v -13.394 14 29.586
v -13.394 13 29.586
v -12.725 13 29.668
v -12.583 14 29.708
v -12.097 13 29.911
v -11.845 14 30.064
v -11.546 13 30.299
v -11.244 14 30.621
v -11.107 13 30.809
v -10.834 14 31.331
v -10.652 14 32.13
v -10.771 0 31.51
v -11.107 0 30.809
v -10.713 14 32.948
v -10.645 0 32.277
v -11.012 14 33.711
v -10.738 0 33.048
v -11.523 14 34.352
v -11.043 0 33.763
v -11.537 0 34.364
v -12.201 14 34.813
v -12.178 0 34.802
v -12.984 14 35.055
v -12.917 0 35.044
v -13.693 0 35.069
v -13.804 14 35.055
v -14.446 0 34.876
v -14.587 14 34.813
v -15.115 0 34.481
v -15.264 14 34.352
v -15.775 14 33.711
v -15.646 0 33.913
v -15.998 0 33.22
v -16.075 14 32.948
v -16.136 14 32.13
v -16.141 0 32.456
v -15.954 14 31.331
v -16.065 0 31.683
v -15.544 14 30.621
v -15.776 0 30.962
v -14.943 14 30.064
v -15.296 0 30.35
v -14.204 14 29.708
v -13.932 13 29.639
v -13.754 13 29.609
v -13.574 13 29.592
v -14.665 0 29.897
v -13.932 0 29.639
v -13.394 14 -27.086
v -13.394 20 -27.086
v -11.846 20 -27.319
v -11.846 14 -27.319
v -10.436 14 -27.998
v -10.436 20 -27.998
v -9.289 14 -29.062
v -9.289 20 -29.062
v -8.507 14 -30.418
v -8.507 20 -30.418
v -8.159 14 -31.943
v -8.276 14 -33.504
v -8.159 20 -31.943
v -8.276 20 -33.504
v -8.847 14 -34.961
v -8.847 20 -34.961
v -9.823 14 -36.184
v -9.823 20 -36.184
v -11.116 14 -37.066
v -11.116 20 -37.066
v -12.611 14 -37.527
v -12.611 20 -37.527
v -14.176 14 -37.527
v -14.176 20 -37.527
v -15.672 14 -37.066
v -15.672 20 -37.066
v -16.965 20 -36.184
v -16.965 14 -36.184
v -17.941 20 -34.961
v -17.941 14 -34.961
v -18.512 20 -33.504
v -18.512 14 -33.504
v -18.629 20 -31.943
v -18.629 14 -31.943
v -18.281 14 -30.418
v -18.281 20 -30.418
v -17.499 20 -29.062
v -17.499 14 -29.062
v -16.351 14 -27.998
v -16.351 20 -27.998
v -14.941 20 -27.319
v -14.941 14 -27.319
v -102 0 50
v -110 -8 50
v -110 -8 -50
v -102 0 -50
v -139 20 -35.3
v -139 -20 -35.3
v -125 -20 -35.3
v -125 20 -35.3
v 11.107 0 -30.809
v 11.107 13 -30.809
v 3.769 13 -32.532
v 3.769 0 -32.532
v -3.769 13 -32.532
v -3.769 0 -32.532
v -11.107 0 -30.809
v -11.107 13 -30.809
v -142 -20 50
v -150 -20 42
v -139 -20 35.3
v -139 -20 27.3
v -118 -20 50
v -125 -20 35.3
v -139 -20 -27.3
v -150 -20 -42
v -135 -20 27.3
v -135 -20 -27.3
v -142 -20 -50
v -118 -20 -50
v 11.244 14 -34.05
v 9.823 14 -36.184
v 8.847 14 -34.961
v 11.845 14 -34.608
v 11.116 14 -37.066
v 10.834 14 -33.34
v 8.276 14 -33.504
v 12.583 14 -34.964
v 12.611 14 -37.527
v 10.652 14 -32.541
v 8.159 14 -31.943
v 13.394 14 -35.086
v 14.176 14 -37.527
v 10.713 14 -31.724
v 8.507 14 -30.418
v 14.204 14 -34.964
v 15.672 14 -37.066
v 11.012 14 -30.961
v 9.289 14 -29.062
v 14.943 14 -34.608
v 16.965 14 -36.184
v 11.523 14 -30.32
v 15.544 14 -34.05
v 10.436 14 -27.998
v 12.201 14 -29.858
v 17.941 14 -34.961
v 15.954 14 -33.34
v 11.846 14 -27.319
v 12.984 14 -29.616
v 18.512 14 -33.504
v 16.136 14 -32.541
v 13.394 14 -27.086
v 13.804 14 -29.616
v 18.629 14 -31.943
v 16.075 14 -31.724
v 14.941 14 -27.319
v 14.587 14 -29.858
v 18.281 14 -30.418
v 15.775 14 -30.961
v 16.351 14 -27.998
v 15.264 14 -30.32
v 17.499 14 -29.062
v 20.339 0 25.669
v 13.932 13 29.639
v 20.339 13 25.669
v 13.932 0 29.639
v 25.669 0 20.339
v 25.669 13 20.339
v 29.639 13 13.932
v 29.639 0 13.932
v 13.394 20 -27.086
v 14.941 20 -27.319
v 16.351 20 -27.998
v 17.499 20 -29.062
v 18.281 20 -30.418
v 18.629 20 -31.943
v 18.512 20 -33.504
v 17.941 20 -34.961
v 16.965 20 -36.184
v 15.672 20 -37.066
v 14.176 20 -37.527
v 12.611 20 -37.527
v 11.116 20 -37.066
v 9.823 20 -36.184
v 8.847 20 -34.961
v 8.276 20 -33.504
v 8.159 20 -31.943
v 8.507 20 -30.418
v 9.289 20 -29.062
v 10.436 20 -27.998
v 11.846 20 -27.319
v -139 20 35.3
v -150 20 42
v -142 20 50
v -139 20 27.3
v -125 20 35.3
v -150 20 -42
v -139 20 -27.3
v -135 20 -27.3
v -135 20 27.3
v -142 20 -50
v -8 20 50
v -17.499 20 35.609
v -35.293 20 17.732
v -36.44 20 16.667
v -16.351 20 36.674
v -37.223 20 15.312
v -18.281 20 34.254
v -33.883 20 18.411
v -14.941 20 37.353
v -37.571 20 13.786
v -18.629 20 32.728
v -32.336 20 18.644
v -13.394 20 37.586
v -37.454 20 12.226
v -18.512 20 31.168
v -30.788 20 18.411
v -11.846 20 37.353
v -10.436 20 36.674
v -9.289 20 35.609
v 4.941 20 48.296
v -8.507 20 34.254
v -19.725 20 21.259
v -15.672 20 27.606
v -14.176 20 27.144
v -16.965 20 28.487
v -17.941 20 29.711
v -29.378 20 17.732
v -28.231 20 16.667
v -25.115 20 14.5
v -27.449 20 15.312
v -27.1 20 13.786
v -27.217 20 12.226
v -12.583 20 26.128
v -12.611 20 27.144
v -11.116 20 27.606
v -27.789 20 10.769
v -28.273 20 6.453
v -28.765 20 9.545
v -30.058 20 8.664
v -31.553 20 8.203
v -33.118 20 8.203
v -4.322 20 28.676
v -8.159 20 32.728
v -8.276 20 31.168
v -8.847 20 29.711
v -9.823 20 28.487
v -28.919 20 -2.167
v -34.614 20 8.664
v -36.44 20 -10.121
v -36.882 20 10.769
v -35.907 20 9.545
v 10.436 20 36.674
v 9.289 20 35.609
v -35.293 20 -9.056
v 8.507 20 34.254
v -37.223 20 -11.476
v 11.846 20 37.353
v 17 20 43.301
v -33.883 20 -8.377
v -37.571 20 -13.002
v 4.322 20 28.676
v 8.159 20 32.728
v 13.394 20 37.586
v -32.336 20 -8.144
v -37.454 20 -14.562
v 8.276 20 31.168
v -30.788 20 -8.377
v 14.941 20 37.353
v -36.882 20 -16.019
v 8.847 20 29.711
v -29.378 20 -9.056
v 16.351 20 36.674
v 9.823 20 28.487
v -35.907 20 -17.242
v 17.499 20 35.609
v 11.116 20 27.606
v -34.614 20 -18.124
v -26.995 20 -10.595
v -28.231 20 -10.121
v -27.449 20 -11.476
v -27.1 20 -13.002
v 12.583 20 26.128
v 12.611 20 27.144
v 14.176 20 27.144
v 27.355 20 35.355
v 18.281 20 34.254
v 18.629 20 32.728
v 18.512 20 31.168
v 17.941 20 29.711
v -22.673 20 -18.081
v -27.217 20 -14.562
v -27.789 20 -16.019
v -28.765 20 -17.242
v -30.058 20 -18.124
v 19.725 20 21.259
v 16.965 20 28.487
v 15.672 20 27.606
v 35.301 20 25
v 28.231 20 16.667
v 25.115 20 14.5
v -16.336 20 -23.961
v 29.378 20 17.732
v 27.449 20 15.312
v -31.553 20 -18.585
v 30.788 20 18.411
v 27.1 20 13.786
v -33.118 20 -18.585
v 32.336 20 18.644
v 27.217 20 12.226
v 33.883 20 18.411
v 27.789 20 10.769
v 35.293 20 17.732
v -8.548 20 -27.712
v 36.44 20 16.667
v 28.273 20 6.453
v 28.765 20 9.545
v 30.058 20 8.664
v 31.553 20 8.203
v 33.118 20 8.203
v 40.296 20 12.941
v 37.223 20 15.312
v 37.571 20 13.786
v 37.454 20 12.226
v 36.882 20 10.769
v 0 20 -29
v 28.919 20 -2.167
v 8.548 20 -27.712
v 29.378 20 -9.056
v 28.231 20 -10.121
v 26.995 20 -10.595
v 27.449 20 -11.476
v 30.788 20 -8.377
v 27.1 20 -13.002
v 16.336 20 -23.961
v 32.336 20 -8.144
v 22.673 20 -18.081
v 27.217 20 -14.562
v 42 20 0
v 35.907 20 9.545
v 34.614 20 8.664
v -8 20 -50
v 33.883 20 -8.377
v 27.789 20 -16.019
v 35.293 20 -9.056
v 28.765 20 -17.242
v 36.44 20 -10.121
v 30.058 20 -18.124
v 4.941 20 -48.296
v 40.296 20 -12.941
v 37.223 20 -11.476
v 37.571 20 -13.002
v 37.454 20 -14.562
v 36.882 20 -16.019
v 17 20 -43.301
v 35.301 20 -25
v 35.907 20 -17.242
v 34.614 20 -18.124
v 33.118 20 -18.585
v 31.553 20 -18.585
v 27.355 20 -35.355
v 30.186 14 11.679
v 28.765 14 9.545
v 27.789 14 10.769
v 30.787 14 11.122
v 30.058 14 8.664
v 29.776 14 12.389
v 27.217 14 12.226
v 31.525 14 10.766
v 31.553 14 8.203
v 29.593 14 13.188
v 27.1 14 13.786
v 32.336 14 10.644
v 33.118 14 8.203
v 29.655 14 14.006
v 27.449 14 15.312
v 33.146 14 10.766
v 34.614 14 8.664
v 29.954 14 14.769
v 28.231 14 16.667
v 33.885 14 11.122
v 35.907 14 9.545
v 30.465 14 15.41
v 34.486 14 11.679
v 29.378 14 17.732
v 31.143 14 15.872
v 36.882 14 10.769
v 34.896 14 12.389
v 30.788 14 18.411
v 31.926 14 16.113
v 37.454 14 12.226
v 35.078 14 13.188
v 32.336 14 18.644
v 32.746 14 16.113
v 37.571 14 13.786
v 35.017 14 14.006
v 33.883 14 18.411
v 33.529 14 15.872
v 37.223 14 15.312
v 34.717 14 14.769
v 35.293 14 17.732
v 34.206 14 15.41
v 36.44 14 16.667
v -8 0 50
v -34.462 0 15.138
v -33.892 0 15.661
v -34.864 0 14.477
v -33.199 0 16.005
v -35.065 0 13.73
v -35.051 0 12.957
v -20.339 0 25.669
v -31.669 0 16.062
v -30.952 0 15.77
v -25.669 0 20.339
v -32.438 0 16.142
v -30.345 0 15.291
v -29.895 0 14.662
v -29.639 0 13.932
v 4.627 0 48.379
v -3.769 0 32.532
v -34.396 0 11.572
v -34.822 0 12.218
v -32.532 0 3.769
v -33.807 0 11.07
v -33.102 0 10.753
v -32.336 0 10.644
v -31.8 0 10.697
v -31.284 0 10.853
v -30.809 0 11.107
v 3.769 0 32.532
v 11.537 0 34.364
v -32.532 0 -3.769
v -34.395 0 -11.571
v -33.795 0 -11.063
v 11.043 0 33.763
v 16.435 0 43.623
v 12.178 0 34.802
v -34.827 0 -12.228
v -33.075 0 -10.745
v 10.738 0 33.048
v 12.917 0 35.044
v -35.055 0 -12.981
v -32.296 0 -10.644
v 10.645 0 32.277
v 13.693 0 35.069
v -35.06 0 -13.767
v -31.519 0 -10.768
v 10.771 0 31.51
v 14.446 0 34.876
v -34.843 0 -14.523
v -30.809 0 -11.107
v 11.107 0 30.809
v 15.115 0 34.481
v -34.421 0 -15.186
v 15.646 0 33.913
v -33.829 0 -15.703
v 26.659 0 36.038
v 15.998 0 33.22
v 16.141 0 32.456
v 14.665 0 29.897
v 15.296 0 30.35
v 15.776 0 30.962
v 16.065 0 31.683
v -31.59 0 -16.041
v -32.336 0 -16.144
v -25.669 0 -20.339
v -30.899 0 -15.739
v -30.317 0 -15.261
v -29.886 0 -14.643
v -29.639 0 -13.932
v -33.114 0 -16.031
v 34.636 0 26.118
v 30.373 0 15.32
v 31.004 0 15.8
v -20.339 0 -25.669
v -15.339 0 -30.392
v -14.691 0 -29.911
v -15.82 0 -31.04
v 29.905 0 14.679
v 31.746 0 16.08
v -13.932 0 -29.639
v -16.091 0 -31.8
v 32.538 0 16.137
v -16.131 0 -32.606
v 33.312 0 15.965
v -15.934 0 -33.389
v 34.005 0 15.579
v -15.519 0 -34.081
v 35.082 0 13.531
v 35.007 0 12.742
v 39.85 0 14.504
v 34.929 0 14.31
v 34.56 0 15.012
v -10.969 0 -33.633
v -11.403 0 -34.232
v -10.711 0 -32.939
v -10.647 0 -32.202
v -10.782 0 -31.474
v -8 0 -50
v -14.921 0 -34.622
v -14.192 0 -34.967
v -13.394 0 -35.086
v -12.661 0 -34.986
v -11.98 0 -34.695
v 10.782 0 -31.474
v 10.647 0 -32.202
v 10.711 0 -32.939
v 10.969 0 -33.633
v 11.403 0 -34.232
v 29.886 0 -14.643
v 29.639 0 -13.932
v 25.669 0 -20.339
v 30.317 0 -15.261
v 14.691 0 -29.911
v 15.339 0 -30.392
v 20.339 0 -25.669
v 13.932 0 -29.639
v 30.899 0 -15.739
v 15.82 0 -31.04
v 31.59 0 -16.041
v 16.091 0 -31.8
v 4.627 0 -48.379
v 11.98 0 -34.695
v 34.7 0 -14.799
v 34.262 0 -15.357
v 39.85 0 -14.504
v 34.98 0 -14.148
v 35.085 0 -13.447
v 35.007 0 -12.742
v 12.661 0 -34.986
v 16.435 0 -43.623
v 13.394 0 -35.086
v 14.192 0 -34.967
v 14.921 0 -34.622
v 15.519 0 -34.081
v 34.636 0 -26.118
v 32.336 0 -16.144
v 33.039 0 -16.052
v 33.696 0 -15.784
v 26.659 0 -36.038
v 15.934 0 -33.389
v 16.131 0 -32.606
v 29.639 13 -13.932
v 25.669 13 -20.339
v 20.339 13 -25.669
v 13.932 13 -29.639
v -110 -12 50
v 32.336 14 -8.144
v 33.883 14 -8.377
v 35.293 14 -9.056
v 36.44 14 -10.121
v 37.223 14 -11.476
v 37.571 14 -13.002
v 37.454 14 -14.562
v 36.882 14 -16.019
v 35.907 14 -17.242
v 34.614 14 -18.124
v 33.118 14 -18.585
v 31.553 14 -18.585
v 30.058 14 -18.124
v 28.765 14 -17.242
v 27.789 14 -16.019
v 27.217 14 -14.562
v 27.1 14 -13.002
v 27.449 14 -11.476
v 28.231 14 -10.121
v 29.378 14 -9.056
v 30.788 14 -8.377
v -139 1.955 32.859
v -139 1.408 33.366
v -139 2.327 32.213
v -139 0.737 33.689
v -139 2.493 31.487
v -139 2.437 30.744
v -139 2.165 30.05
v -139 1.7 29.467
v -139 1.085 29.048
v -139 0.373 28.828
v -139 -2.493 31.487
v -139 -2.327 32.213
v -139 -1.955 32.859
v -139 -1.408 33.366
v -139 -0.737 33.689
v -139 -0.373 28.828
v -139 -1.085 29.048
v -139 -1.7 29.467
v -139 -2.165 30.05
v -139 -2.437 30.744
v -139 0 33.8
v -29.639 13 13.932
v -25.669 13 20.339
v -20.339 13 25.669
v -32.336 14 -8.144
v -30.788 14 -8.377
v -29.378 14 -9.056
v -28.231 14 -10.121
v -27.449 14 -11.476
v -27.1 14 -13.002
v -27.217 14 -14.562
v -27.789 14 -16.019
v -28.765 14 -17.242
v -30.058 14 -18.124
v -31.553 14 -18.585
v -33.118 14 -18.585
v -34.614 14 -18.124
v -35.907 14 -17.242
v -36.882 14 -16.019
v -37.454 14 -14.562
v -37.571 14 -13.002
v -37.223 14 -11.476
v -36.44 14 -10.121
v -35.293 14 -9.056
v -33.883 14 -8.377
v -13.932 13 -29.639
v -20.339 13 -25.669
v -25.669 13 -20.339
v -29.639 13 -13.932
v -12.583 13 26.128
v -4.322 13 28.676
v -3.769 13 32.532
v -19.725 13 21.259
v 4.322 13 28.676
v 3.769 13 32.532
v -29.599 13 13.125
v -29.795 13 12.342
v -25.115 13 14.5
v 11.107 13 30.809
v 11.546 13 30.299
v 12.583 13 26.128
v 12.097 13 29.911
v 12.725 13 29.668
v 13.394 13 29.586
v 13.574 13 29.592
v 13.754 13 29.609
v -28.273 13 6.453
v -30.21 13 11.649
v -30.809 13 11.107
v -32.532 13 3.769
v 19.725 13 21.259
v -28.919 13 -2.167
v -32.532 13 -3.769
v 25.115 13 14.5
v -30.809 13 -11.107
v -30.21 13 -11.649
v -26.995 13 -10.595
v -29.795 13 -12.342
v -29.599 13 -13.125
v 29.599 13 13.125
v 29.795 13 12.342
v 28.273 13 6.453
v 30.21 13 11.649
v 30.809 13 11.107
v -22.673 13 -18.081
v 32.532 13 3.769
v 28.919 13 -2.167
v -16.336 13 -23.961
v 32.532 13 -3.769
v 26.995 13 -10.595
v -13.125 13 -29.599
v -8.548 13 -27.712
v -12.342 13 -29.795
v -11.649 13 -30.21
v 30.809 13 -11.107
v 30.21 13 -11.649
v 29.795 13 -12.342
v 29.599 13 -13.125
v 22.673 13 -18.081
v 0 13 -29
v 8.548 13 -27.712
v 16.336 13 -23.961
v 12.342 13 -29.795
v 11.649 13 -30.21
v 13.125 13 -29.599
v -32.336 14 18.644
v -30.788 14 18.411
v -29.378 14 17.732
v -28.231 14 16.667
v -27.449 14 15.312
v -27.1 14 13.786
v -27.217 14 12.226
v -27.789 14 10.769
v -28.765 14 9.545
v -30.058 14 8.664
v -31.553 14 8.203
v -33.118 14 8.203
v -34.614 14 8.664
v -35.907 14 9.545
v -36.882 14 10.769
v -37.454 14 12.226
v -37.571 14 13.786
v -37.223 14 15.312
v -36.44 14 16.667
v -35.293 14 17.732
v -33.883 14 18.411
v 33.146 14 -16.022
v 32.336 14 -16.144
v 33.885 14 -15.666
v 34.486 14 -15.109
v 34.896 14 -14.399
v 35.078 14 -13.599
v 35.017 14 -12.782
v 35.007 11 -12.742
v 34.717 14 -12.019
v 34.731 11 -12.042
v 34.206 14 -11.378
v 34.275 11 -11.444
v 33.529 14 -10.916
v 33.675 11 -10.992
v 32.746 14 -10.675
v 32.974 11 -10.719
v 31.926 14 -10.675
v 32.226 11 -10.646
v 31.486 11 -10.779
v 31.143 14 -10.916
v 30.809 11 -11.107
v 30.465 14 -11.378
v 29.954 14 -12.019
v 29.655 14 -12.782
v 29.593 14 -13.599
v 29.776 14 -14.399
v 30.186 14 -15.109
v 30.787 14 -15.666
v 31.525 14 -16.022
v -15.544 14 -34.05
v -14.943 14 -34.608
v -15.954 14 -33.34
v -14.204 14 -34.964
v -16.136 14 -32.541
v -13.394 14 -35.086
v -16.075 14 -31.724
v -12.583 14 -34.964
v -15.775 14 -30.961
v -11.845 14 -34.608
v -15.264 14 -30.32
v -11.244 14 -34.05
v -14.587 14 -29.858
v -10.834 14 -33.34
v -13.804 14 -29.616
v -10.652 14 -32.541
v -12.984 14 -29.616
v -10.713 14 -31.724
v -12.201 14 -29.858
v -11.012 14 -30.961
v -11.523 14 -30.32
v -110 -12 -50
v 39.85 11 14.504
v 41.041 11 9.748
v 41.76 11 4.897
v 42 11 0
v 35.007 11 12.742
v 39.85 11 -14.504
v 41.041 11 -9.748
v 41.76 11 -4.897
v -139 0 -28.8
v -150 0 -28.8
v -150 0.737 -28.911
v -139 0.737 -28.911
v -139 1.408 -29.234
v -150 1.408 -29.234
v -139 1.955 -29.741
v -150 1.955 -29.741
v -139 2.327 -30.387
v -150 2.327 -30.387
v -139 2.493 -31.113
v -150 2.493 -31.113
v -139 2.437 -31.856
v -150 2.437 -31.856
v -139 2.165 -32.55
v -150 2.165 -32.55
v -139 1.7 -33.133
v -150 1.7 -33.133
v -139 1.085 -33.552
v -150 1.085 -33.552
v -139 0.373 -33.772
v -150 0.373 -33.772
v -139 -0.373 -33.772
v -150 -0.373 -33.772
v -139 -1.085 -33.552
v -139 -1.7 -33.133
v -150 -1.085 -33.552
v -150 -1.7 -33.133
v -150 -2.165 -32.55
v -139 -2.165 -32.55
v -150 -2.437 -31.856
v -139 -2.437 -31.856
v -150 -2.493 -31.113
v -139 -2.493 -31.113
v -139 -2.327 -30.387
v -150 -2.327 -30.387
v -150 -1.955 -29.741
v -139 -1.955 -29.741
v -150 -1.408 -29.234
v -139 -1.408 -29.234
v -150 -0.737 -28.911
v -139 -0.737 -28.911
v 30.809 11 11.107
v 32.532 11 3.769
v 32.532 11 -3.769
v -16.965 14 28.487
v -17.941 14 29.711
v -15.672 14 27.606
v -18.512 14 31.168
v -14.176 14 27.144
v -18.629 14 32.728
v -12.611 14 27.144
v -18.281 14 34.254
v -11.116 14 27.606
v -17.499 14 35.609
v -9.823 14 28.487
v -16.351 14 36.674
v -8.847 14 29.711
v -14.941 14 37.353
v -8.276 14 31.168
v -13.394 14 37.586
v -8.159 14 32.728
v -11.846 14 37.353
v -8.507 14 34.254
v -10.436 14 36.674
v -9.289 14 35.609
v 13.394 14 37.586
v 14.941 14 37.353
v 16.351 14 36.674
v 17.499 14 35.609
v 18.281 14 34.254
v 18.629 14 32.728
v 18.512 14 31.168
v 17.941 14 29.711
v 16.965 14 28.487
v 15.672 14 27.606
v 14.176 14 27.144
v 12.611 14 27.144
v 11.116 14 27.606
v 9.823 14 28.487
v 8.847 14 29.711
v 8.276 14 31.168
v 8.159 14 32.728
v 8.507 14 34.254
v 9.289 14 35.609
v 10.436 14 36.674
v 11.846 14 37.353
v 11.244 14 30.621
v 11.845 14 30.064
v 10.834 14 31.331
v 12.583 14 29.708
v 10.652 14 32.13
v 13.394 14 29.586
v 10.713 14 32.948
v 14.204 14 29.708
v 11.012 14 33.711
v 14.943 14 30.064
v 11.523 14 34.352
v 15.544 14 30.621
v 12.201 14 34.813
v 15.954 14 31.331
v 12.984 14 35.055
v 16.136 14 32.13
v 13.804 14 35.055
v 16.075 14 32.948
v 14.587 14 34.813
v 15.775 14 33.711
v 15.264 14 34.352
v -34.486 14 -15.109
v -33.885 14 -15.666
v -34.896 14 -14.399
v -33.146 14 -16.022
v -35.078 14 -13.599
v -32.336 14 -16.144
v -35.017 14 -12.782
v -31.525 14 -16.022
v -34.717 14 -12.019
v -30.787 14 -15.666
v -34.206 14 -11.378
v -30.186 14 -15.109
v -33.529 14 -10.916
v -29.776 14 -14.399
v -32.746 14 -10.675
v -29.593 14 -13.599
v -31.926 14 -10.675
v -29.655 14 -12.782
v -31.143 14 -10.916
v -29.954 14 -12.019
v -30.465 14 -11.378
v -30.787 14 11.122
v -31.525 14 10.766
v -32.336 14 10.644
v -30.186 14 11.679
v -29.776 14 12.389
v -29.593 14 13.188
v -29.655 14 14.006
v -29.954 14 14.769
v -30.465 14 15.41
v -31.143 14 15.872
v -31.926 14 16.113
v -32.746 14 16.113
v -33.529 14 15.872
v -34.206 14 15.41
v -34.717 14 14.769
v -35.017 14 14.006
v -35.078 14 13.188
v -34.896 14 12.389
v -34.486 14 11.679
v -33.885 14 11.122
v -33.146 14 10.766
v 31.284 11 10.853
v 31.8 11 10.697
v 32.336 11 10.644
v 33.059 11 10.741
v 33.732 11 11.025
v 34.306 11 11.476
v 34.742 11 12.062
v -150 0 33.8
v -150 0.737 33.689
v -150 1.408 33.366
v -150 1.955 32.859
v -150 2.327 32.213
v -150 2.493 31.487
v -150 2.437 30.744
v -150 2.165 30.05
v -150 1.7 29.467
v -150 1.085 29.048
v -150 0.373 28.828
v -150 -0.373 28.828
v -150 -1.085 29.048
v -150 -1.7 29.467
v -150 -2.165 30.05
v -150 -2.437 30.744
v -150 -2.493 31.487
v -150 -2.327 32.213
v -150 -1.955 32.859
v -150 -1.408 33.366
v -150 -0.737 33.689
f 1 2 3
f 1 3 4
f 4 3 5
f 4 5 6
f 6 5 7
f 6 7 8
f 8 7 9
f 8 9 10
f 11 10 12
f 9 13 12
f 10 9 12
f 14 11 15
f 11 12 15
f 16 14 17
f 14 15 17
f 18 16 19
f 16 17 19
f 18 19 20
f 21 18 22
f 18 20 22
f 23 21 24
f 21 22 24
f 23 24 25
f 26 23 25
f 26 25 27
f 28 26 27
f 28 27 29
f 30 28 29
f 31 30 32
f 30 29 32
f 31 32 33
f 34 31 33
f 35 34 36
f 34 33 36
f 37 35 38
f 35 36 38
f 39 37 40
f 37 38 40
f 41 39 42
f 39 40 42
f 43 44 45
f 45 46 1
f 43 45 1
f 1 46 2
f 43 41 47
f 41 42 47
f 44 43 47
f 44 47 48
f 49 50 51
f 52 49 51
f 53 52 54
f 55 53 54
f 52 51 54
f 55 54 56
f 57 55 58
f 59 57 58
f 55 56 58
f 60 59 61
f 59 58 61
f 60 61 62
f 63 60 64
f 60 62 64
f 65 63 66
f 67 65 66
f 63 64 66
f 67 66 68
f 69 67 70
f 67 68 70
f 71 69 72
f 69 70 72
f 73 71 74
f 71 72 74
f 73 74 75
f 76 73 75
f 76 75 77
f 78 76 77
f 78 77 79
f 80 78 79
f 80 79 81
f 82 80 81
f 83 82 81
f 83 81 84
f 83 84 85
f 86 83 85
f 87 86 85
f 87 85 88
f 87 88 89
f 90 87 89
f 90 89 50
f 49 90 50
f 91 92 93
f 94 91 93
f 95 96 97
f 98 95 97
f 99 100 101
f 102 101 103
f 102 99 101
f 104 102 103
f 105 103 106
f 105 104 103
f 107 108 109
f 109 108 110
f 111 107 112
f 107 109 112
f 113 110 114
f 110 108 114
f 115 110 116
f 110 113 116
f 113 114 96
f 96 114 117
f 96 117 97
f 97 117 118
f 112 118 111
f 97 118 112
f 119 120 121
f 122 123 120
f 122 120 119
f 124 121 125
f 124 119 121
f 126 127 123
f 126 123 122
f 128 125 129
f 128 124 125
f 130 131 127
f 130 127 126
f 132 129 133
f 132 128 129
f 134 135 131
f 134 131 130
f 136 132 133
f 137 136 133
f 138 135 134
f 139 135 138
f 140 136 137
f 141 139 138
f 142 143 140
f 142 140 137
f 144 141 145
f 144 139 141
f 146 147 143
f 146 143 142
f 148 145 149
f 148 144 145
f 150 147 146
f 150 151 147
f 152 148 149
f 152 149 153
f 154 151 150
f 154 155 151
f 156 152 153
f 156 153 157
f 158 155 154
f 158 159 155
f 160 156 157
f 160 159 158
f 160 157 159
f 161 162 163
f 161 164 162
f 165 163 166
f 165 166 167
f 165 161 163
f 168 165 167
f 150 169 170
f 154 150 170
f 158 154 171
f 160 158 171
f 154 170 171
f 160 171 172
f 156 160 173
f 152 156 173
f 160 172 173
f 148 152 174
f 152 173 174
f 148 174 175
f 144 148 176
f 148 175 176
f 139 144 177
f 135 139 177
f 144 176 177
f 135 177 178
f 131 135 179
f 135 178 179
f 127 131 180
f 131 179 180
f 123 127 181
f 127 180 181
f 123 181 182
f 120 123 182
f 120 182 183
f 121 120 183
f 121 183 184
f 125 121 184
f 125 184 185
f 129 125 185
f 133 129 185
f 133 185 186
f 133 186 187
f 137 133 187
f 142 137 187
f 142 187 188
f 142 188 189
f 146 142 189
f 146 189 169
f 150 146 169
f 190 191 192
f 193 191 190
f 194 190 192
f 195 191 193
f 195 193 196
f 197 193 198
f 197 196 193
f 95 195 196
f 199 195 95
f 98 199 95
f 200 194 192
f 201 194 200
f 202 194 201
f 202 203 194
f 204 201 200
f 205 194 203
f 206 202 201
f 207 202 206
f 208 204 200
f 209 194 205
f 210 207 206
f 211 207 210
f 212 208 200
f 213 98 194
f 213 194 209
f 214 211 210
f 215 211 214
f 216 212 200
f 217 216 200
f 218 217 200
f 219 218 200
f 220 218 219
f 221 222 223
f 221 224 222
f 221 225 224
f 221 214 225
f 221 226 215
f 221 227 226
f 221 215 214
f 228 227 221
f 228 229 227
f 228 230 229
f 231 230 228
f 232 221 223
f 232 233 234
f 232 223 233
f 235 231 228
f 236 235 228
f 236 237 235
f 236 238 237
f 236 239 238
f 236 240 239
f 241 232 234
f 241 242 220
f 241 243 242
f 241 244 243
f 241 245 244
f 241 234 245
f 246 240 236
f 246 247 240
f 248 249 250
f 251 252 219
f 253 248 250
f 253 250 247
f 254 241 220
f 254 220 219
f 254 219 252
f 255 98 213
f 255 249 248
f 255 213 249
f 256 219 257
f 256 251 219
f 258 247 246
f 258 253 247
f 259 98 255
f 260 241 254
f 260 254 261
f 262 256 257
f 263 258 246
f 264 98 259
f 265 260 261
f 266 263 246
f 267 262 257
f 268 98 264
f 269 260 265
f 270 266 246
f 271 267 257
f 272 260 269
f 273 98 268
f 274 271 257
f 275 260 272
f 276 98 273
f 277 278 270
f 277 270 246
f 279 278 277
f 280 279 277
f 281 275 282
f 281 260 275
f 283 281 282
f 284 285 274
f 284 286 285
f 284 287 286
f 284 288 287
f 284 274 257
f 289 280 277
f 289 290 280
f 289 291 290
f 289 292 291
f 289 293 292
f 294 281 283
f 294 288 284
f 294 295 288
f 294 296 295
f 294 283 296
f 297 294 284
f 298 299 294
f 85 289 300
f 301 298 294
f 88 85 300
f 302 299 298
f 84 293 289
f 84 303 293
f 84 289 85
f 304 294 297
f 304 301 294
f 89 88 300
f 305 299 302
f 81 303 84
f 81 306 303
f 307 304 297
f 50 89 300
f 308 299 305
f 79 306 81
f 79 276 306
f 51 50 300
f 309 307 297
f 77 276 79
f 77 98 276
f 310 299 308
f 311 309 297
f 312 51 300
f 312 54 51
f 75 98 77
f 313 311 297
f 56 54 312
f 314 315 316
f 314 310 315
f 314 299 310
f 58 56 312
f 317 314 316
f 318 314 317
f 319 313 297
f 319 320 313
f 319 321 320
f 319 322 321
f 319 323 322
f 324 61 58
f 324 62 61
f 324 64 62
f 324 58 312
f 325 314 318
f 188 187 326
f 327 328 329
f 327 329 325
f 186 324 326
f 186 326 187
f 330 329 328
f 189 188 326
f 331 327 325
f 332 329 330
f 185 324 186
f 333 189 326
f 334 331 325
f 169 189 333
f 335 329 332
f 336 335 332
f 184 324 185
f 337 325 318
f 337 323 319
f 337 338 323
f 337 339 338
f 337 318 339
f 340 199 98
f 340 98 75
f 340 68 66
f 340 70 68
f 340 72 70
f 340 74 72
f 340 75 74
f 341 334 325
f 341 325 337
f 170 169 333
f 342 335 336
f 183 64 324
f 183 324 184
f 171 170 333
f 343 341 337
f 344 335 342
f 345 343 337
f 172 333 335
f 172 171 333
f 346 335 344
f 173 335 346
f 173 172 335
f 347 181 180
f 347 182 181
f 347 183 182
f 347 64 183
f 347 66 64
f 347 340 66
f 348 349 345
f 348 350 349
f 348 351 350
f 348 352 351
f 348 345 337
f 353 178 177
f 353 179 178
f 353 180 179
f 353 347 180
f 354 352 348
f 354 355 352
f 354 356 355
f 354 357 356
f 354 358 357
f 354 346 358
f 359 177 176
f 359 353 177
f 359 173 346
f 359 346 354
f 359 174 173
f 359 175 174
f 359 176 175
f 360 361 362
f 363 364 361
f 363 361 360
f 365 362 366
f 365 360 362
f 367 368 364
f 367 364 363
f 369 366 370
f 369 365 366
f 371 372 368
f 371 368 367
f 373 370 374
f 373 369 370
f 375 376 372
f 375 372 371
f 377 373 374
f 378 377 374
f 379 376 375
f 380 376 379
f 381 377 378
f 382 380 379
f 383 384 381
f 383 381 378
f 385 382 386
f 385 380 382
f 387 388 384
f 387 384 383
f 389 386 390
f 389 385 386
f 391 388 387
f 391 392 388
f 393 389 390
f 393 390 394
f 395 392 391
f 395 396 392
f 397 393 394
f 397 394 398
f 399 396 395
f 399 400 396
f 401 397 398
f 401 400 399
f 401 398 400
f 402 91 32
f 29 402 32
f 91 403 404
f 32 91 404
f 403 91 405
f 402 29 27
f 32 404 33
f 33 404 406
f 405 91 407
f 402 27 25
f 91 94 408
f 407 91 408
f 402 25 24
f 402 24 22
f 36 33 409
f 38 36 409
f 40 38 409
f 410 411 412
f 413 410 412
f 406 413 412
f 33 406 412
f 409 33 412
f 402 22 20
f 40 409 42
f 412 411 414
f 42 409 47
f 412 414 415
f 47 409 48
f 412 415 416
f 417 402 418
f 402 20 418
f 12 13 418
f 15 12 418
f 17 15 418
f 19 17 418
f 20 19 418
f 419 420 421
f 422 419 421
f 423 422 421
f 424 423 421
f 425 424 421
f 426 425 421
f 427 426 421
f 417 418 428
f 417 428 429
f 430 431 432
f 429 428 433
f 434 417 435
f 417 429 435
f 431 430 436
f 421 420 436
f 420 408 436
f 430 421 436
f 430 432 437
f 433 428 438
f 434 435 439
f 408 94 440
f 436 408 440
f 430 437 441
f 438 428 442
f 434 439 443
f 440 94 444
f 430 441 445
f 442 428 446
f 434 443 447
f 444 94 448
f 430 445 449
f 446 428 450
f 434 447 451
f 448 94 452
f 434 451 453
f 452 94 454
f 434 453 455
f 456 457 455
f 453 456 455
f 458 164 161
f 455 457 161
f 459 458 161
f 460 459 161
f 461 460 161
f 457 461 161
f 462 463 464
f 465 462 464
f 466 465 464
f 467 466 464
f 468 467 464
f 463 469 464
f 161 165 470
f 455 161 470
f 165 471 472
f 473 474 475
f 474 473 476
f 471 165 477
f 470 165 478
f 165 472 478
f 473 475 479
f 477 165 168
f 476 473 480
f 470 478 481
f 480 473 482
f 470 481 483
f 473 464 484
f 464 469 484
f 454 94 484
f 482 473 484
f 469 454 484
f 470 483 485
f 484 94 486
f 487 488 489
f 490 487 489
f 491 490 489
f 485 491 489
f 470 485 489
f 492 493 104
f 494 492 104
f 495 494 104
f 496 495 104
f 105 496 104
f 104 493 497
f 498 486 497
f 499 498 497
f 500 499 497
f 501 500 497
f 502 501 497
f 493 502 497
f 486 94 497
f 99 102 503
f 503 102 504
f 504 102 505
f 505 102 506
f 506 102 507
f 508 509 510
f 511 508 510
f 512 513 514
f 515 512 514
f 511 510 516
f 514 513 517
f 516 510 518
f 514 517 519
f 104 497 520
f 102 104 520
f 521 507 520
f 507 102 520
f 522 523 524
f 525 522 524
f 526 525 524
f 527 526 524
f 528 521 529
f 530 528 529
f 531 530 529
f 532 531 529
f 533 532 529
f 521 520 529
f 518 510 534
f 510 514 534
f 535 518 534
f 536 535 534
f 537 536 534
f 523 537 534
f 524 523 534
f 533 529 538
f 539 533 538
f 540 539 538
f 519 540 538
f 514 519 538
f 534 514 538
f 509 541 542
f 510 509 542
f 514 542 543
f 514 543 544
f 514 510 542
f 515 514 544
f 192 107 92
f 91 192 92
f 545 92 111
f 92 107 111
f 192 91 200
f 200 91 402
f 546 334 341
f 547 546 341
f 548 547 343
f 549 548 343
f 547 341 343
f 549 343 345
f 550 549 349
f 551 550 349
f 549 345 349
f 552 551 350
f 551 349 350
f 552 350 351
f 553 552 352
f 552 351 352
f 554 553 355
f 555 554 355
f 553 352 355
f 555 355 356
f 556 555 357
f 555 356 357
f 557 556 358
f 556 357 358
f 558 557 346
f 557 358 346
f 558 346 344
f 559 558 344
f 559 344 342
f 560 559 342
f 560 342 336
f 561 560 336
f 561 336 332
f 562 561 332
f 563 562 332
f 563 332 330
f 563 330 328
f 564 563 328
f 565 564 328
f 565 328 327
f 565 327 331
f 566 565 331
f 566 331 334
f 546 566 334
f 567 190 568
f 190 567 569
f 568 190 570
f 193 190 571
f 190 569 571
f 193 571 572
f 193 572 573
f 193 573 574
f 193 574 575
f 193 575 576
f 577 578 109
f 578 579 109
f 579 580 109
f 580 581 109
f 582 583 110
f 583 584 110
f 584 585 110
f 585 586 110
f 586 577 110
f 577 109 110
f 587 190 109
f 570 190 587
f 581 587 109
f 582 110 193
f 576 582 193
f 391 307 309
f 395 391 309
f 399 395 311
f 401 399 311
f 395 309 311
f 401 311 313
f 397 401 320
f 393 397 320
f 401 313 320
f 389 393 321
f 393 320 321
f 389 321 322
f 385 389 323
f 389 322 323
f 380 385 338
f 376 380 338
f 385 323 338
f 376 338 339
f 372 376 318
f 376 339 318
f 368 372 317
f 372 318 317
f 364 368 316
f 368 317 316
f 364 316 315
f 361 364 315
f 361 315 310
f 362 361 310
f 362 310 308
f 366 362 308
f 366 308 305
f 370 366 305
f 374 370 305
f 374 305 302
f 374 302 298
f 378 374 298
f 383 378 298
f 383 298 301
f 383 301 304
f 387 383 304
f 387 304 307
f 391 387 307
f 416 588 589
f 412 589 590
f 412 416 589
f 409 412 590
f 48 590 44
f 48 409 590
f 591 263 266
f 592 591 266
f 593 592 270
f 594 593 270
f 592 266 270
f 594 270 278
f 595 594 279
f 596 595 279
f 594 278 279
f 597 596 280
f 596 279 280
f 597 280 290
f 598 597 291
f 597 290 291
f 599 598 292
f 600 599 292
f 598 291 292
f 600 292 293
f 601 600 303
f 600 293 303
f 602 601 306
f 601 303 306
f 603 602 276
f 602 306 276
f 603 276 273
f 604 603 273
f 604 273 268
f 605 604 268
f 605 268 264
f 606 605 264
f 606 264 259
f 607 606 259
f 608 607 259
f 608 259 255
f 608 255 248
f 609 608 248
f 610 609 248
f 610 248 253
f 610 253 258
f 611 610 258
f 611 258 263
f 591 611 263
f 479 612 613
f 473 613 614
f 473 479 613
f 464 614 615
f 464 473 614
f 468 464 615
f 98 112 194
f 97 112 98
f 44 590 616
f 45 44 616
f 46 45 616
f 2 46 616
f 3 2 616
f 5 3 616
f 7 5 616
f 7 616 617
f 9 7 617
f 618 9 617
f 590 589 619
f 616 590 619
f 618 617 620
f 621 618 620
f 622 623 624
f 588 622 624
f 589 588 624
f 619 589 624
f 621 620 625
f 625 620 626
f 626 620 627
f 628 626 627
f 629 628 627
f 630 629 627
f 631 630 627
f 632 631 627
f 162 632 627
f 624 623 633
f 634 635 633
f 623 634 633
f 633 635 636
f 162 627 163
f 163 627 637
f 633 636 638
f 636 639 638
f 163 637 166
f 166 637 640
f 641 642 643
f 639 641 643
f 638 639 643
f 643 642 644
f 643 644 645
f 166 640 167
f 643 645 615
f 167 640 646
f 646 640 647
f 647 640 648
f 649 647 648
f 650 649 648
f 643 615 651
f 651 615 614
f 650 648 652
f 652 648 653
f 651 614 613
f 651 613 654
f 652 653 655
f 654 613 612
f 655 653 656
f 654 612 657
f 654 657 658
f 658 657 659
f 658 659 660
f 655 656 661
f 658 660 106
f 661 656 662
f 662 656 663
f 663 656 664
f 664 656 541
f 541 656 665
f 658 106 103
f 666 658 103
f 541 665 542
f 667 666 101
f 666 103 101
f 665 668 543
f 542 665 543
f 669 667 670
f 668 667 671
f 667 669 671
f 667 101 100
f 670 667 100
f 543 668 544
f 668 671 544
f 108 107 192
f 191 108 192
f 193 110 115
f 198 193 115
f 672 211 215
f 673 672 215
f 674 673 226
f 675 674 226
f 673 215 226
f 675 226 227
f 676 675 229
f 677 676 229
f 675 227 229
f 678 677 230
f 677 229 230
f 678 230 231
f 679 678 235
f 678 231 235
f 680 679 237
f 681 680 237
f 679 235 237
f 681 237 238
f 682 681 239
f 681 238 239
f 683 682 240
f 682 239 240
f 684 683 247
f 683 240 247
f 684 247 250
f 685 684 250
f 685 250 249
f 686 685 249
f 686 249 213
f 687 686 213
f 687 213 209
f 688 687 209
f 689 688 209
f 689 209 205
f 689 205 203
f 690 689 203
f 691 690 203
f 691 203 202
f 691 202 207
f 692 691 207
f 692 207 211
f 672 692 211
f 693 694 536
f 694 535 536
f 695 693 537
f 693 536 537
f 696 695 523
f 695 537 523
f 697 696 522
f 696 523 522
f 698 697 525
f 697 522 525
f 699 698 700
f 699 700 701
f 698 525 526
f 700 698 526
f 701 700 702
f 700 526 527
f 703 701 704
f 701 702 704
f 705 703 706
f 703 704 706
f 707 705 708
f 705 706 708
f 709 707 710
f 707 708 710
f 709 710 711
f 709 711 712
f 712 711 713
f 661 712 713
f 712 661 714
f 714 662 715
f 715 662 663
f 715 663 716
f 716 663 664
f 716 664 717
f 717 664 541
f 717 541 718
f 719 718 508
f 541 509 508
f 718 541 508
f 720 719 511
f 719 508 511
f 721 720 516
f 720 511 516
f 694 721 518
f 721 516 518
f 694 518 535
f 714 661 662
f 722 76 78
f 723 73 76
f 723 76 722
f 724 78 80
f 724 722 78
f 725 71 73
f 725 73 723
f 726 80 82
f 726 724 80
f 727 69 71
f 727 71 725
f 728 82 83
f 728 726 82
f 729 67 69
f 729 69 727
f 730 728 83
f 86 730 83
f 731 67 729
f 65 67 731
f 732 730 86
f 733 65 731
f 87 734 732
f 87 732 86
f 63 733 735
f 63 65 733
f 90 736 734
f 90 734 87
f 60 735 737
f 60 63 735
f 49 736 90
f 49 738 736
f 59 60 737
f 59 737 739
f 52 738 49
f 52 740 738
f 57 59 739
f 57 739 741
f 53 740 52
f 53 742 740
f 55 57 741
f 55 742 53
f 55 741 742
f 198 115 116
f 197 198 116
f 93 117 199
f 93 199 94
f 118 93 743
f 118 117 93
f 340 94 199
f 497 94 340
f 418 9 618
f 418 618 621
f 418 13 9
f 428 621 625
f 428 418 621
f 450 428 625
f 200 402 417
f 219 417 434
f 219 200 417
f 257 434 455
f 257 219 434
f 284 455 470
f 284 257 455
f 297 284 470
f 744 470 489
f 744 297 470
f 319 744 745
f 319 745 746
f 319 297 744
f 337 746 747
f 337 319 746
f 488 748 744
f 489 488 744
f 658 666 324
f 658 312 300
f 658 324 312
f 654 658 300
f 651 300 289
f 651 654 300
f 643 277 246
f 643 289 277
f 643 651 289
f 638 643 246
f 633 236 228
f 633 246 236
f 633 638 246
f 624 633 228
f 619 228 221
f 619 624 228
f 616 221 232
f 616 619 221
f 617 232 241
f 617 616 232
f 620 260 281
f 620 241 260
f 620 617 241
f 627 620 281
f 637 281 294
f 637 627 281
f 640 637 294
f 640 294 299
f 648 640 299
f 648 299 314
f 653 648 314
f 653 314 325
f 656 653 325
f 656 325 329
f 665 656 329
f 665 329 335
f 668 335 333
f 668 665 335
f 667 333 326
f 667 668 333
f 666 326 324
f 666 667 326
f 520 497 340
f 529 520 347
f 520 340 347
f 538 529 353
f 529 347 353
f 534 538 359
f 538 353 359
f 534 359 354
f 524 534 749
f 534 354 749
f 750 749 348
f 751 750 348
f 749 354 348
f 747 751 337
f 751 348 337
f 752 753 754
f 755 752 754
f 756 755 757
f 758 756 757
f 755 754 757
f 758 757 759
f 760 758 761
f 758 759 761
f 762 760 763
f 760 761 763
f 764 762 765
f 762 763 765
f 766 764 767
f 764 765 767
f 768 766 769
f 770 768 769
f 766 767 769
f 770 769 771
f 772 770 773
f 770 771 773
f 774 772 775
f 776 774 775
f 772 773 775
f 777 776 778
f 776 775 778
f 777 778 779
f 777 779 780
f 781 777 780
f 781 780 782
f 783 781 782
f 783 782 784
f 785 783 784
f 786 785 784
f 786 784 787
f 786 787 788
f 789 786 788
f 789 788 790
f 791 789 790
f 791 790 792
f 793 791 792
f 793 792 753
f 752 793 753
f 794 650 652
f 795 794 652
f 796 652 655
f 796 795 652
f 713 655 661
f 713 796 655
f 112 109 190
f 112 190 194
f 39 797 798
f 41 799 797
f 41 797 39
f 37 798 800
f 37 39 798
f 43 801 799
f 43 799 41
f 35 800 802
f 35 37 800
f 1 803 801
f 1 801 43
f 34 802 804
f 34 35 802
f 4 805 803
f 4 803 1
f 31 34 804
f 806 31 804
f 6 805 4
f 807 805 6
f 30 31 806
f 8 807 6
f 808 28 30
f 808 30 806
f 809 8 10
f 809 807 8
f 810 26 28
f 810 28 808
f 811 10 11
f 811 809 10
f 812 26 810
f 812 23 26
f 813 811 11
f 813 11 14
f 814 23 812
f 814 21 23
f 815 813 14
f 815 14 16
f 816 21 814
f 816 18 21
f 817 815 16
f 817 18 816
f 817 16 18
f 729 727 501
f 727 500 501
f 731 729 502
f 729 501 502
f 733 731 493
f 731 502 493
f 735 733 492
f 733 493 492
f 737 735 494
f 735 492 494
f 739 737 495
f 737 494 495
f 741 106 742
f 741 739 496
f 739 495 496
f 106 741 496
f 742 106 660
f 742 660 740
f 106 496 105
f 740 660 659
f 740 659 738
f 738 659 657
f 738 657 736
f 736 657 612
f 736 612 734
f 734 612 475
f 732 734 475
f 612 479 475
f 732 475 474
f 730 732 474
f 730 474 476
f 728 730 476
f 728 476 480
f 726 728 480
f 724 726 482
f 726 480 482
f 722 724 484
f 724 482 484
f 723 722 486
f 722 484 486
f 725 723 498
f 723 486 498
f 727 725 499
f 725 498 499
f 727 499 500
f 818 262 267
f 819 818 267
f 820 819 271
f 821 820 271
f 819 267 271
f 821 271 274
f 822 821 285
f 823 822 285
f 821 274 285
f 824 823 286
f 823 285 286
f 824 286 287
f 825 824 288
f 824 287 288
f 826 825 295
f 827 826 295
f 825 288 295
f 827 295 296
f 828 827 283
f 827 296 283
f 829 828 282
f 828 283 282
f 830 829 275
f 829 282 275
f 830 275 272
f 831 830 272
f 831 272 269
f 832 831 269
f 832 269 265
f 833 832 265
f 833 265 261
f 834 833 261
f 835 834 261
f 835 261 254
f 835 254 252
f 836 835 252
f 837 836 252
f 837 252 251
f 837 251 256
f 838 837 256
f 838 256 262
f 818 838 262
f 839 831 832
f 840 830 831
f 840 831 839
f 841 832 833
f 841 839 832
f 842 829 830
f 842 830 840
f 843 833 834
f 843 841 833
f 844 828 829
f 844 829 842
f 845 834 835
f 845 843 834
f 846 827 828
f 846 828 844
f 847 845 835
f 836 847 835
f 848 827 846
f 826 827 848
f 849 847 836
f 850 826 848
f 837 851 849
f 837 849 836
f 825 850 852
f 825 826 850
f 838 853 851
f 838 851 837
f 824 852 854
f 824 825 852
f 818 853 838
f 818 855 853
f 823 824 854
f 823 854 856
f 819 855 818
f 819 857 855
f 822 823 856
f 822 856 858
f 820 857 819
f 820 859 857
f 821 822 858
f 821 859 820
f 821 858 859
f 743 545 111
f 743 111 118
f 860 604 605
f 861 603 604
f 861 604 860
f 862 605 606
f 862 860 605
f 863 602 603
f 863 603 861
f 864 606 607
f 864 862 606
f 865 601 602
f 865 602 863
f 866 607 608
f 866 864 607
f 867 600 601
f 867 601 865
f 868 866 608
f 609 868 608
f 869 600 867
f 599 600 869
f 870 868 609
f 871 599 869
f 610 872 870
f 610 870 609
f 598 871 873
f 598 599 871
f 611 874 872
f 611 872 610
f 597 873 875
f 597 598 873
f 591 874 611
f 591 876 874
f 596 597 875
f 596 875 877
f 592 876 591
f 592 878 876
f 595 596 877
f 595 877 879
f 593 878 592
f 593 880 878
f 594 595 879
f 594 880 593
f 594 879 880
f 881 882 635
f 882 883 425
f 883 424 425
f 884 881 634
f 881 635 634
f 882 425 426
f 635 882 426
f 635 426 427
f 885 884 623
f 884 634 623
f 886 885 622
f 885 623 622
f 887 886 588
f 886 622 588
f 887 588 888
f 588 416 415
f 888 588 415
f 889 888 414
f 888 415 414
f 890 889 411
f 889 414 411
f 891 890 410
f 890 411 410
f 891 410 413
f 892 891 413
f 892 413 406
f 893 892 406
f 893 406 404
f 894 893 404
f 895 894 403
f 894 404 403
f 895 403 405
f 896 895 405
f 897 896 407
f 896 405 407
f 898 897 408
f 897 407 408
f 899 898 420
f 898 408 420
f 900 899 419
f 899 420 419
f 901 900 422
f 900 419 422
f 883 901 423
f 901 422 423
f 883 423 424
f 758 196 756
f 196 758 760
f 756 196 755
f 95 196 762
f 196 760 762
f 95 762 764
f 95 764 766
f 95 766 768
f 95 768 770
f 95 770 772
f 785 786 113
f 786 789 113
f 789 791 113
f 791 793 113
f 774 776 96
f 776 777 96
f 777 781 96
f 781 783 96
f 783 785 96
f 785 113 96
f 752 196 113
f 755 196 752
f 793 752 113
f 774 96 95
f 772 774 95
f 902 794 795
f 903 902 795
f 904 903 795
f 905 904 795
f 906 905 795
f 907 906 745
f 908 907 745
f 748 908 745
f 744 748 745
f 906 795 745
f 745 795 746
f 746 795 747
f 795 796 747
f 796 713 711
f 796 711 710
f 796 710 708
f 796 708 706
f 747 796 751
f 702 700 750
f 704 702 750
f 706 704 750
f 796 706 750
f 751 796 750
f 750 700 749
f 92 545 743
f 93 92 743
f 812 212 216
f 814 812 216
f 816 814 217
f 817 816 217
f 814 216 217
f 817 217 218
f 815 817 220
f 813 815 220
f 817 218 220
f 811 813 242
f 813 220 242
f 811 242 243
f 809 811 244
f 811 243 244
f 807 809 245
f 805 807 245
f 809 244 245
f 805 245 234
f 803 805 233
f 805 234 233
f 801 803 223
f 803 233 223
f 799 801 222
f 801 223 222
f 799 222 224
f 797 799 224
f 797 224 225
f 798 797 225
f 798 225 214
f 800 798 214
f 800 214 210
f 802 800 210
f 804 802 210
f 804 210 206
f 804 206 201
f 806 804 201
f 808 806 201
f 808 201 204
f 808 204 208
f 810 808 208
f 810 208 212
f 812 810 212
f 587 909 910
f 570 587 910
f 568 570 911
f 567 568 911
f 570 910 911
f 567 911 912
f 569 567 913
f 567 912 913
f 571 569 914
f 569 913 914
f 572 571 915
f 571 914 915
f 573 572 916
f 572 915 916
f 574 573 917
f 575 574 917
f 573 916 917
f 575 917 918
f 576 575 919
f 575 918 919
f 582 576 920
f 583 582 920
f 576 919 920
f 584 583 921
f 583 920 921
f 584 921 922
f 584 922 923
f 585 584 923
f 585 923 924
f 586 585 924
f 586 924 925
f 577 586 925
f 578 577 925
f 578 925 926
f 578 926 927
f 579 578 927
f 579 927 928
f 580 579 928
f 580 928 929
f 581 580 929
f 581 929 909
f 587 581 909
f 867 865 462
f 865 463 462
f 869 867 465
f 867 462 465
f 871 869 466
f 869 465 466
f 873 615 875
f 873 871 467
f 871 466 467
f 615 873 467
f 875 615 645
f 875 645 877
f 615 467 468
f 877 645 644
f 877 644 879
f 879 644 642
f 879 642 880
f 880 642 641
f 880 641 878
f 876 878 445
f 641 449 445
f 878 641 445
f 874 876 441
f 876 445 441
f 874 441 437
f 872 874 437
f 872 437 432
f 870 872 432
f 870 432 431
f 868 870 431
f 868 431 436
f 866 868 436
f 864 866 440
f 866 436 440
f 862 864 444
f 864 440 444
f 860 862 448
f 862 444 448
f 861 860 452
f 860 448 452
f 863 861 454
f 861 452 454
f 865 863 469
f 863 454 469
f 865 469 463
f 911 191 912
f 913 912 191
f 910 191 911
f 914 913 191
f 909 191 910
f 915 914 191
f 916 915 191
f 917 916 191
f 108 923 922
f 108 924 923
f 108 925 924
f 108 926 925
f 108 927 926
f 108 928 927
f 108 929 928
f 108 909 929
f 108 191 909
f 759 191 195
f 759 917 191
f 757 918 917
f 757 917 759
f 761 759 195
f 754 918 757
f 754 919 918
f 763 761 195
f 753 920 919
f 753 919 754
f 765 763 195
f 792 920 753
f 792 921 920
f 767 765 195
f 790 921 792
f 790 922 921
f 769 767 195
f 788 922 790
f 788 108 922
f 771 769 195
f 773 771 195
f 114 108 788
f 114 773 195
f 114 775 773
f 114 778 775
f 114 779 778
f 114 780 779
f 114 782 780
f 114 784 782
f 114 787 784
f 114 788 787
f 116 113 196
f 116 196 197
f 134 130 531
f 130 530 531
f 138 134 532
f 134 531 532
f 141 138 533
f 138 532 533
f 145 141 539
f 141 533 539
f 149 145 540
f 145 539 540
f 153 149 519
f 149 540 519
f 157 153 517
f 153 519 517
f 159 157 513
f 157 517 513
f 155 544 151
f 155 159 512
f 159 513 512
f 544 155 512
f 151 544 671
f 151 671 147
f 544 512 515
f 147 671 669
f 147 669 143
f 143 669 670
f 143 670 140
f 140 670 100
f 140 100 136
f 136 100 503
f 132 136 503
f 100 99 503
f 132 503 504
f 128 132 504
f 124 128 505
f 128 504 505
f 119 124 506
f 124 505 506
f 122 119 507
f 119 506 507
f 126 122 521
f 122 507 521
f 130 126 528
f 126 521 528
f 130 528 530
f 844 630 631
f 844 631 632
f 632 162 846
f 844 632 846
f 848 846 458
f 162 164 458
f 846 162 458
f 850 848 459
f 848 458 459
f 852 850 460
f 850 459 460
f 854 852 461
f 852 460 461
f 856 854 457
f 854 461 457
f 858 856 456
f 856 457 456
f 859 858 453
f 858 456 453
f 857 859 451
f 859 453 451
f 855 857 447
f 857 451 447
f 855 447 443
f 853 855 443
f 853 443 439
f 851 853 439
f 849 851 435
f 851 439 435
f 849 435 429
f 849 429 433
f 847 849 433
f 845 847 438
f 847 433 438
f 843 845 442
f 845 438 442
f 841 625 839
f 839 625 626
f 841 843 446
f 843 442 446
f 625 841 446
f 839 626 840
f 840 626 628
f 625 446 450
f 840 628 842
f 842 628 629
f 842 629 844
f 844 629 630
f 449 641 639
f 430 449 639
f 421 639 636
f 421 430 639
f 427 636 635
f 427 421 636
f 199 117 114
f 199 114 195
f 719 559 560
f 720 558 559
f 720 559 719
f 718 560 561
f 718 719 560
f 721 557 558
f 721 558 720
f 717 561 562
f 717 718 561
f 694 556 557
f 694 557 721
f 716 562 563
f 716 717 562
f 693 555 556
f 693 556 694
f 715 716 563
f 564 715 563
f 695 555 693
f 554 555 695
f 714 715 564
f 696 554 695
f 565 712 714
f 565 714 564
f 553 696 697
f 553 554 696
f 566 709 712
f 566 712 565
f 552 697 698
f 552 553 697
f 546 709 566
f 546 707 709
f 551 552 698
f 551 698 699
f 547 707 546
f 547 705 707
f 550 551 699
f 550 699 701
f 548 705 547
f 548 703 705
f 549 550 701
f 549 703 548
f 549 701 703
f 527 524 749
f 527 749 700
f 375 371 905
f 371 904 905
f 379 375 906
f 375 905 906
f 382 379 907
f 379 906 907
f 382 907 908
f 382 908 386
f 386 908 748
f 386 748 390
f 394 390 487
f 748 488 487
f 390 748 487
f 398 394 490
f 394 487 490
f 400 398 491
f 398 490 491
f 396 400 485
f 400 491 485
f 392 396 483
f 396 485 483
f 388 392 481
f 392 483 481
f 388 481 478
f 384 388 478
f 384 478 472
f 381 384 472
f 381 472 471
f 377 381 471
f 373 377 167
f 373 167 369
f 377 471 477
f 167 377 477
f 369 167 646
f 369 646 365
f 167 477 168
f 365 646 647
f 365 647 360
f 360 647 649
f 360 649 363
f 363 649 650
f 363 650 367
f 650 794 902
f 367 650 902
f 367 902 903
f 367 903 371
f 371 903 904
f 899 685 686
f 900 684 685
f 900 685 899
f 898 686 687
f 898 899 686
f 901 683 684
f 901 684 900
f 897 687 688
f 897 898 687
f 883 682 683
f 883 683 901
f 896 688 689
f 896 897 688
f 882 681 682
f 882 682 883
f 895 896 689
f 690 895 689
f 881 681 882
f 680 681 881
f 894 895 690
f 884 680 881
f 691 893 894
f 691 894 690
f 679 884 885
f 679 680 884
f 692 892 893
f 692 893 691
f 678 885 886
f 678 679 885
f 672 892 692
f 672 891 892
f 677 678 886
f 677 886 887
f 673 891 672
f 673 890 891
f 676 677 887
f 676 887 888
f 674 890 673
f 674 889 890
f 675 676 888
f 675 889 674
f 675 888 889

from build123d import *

# Parameters (mm, degrees)
SKETCH1_W                               = 152
SKETCH1_H                               = 100
BOSS_EXTRUDE1_DEPTH                     = 20
BOSS_EXTRUDE2_DEPTH                     = 20
BOSS_EXTRUDE2_DEPTH_BACK                = 20
SKETCH18_W                              = 40
SKETCH18_H                              = 100
SKETCH18_W_2                            = 10
SKETCH18_H_2                            = 70.6
CUT_EXTRUDE3_DEPTH                      = 160.373774505
CUT_EXTRUDE3_DEPTH_BACK                 = 160.373774505
SKETCH19_W                              = 4
SKETCH19_H                              = 8
SKETCH20_R                              = 2.5
CUT_EXTRUDE4_DEPTH                      = 15
CHAMFER1_SIZE                           = 8
CUT_EXTRUDE1_DEPTH                      = 164.095064303
CUT_EXTRUDE1_DEPTH_BACK                 = 164.095064303
SKETCH11_R                              = 29
CUT_EXTRUDE5_DEPTH                      = 11
SKETCH15_R                              = 32.75
CUT_EXTRUDE2_DEPTH                      = 13
CBORE_FOR_M5_HEX_HEAD_BOLT2_D           = 5.5
CBORE_FOR_M5_HEX_HEAD_BOLT2_CBORE_D     = 10.5
CBORE_FOR_M5_HEX_HEAD_BOLT2_CBORE_DEPTH = 6
FILLET1_R                               = 50


with BuildPart() as part:
    # Sketch1 → Boss-Extrude1 (new body)
    with BuildSketch(Plane(origin=(0, 0, 0), x_dir=(1, 0, 0), z_dir=(0, 1, 0))):
        with Locations((-34, 0)):
            Rectangle(SKETCH1_W, SKETCH1_H)
    extrude(amount=BOSS_EXTRUDE1_DEPTH)

    # Sketch18 → Boss-Extrude2 (add, two sides: drawn at the far end of the back side and taken through both)
    with BuildSketch(Plane(origin=(0, 0, 0), x_dir=(1, 0, 0), z_dir=(0, 1, 0)).offset(-BOSS_EXTRUDE2_DEPTH_BACK)):
        with Locations((-130, 0)):
            Rectangle(SKETCH18_W, SKETCH18_H)
        with Locations((-130, 0)):
            Rectangle(SKETCH18_W_2, SKETCH18_H_2, mode=Mode.SUBTRACT)
    extrude(amount=BOSS_EXTRUDE2_DEPTH + BOSS_EXTRUDE2_DEPTH_BACK)

    # Sketch19 → Cut-Extrude3 (cut, two sides: drawn at the far end of the back side and taken through both)
    with BuildSketch(Plane(origin=(0, 0, 0), x_dir=(1, 0, 0), z_dir=(0, 1, 0)).offset(-CUT_EXTRUDE3_DEPTH_BACK)):
        with Locations((-137, -31.3)):
            Rectangle(SKETCH19_W, SKETCH19_H)
        with Locations((-137, 31.3)):
            Rectangle(SKETCH19_W, SKETCH19_H)
    extrude(amount=CUT_EXTRUDE3_DEPTH + CUT_EXTRUDE3_DEPTH_BACK, mode=Mode.SUBTRACT)

    # Sketch20 → Cut-Extrude4 (cut)
    with BuildSketch(Plane.ZY.offset(150)):
        with Locations((-31.3, 0)):
            Circle(SKETCH20_R)
        with Locations((31.3, 0)):
            Circle(SKETCH20_R)
    extrude(amount=-CUT_EXTRUDE4_DEPTH, mode=Mode.SUBTRACT)

    # Chamfer1
    chamfer1_edges = [part.edges().sort_by_distance(p)[0] for p in [
        (-110, -20, 0),
        (-150, 0, 50),
        (-150, 0, -50),
        (-110, 0, 0),
    ]]
    chamfer(chamfer1_edges, length=CHAMFER1_SIZE)

    # Sketch11 → Cut-Extrude1 (cut, two sides: drawn at the far end of the back side and taken through both)
    with BuildSketch(Plane(origin=(0, 20, 0), x_dir=(1, 0, 0), z_dir=(0, 1, 0)).offset(-CUT_EXTRUDE1_DEPTH_BACK)):
        with Locations(Location((0, 0, 0), (0, 0, 90))):
            Circle(SKETCH11_R)
    extrude(amount=CUT_EXTRUDE1_DEPTH + CUT_EXTRUDE1_DEPTH_BACK, mode=Mode.SUBTRACT)

    # Sketch21 → Cut-Extrude5 (cut)
    with BuildSketch(Plane(origin=(0, 0, 0), x_dir=(1, 0, 0), z_dir=(0, 1, 0))):
        Polygon((0, 0), (52.866493453, -19.241830007), (52.866493453, 19.241830007), align=None)
    extrude(amount=CUT_EXTRUDE5_DEPTH, mode=Mode.SUBTRACT)

    # Sketch15 → Cut-Extrude2 (cut)
    with BuildSketch(Plane(origin=(0, 0, 0), x_dir=(1, 0, 0), z_dir=(0, 1, 0))):
        with Locations(Location((0, 0, 0), (0, 0, 20))):
            Circle(SKETCH15_R)
    extrude(amount=CUT_EXTRUDE2_DEPTH, mode=Mode.SUBTRACT)

    # CBORE for M5 Hex Head Bolt2 (through all)
    with Locations(Plane(origin=(-32.335783638, 20, -13.393920133), x_dir=(0, 0, 1), z_dir=(0, 1, 0))):
        with Locations((0, 0), (-18.941863505, 18.941863505), (-18.941863505, 45.729703771), (0, 64.671567276), (26.787840266, 64.671567276), (45.729703771, 45.729703771), (45.729703771, 18.941863505), (26.787840266, 0)):
            CounterBoreHole(CBORE_FOR_M5_HEX_HEAD_BOLT2_D / 2, CBORE_FOR_M5_HEX_HEAD_BOLT2_CBORE_D / 2, CBORE_FOR_M5_HEX_HEAD_BOLT2_CBORE_DEPTH)

    # Fillet1
    fillet1_edges = [part.edges().sort_by_distance(p)[0] for p in [
        (42, 10, -50),
        (42, 10, 50),
    ]]
    fillet(fillet1_edges, radius=FILLET1_R - 0.0001)  # a hair under: the kernel refuses the full size


solid = part.part
